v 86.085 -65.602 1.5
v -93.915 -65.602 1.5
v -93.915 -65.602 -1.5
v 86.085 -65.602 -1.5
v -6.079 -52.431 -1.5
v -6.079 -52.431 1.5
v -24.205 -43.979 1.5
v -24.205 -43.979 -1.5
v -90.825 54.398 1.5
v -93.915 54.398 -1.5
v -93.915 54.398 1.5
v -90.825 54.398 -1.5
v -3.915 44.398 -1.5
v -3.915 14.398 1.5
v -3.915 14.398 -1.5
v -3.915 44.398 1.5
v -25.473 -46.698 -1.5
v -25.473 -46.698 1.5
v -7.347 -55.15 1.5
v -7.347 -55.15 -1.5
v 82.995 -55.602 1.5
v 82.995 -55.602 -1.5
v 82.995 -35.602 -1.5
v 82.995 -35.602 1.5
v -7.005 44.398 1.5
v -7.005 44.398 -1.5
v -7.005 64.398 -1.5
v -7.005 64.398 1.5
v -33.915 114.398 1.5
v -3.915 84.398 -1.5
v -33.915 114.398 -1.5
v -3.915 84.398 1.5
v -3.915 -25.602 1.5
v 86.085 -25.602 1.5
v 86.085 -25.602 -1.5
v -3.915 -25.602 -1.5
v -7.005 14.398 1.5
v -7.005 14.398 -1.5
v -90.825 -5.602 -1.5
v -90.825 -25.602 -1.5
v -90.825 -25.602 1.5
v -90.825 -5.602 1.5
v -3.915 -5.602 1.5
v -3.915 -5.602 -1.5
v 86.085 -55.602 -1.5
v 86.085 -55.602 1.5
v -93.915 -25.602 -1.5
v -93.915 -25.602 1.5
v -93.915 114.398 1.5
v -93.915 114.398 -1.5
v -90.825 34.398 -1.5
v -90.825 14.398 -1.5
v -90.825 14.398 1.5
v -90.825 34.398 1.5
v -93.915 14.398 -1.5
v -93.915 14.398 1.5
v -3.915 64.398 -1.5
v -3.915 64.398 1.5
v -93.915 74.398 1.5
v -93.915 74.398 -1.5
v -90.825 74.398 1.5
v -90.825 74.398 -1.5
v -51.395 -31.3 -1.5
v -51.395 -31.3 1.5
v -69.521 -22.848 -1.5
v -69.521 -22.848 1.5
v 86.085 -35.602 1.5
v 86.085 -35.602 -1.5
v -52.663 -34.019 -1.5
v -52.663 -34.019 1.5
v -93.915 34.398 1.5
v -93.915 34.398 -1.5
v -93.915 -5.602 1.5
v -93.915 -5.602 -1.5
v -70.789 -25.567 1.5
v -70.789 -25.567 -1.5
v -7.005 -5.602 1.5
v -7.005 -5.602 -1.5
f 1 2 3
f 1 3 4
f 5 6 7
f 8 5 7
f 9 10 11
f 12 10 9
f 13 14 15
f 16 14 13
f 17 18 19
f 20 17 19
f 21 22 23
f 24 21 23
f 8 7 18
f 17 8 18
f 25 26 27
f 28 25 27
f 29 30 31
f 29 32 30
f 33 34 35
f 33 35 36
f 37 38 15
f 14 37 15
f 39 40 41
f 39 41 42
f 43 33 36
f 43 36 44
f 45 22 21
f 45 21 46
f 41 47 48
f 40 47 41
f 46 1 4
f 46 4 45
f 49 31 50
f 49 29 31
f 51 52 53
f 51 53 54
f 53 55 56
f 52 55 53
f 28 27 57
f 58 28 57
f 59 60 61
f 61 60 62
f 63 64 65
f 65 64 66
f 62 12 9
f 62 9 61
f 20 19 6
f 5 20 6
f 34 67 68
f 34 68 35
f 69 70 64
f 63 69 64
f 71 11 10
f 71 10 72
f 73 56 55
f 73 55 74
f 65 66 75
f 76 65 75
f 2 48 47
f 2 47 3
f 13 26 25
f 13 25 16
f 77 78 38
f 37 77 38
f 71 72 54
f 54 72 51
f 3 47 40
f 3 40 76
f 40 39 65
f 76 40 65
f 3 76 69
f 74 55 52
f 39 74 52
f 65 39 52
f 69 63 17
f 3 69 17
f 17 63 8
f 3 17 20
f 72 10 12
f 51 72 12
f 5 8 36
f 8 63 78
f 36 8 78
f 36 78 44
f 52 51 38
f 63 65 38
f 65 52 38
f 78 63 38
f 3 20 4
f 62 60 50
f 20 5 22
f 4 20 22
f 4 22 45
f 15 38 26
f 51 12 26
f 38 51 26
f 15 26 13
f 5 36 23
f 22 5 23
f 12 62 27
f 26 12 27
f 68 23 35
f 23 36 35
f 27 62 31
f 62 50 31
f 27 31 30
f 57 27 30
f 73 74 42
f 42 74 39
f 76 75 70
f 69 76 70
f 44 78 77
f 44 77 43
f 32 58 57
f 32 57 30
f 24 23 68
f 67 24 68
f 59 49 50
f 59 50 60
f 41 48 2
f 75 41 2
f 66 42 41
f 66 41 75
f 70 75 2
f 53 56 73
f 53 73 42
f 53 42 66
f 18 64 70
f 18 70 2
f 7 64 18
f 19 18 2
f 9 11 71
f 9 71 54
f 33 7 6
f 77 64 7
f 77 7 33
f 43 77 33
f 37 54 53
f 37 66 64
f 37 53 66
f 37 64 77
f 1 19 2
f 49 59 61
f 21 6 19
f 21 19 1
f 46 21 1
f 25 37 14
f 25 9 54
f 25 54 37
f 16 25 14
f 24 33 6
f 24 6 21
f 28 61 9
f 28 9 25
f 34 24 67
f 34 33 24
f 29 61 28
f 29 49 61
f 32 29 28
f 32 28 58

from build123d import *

# Parameters (mm, degrees)
BOSS_EXTRUDE1_DEPTH          = 1.5
SKETCH1_3_W                  = 3.18
SKETCH1_3_H                  = 20
CUT_EXTRUDE_THIN1_DEPTH      = 2.5
CUT_EXTRUDE_THIN1_DEPTH_BACK = 2.5
CUT_EXTRUDE1_REACH           = 5


with BuildPart() as part:
    # Sketch1 → Boss-Extrude1 (new body, symmetric)
    with BuildSketch(Plane.XY):
        Polygon((-93.914893617, 114.397705985), (-93.914893617, -65.602294015), (86.085106383, -65.602294015), (86.085106383, -25.602294015), (-3.914893617, -25.602294015), (-3.914893617, 84.397705985), (-33.914893617, 114.397705985), align=None)
    extrude(amount=BOSS_EXTRUDE1_DEPTH, both=True)

    # Sketch1_3 → Cut-Extrude-Thin1 (cut, two sides)
    with BuildSketch(Plane.XY) as cut_extrude_thin1_sk:
        with Locations((-92.414893617, 64.397705985)):
            Rectangle(SKETCH1_3_W, SKETCH1_3_H)
        with Locations((-92.414893617, 24.397705985)):
            Rectangle(SKETCH1_3_W, SKETCH1_3_H)
        with Locations((-92.414893617, -15.602294015)):
            Rectangle(SKETCH1_3_W, SKETCH1_3_H)
        with Locations((-5.414893617, 54.397705985)):
            Rectangle(SKETCH1_3_W, SKETCH1_3_H)
        with Locations((-5.414893617, 4.397705985)):
            Rectangle(SKETCH1_3_W, SKETCH1_3_H)
        with Locations((84.585106383, -45.602294015)):
            Rectangle(SKETCH1_3_W, SKETCH1_3_H)
    extrude(amount=CUT_EXTRUDE_THIN1_DEPTH, mode=Mode.SUBTRACT)
    extrude(cut_extrude_thin1_sk.sketch, amount=-CUT_EXTRUDE_THIN1_DEPTH_BACK, mode=Mode.SUBTRACT)

    # Sketch2 → Cut-Extrude1 (cut, up to next)
    with BuildSketch(Plane.XY.offset(1.5), mode=Mode.PRIVATE) as cut_extrude1_sk1:
        Polygon((-25.473348524, -46.697563546), (-7.347192784, -55.14992878), (-6.079337999, -52.431005419), (-24.205493739, -43.978640185), align=None)
    cut_extrude1_tool1 = extrude(cut_extrude1_sk1.sketch, amount=-CUT_EXTRUDE1_REACH, mode=Mode.PRIVATE) & part.part
    add(cut_extrude1_tool1.solids().sort_by_distance((-15.776343, -49.564284, 1.5))[0], mode=Mode.SUBTRACT)
    # Sketch2 → Cut-Extrude1 (cut, up to next)
    with BuildSketch(Plane.XY.offset(1.5), mode=Mode.PRIVATE) as cut_extrude1_sk2:
        Polygon((-51.39472735, -31.300092332), (-69.520883091, -22.847727097), (-70.788737876, -25.566650459), (-52.662582136, -34.019015693), align=None)
    cut_extrude1_tool2 = extrude(cut_extrude1_sk2.sketch, amount=-CUT_EXTRUDE1_REACH, mode=Mode.PRIVATE) & part.part
    add(cut_extrude1_tool2.solids().sort_by_distance((-61.091733, -28.433371, 1.5))[0], mode=Mode.SUBTRACT)


solid = part.part
